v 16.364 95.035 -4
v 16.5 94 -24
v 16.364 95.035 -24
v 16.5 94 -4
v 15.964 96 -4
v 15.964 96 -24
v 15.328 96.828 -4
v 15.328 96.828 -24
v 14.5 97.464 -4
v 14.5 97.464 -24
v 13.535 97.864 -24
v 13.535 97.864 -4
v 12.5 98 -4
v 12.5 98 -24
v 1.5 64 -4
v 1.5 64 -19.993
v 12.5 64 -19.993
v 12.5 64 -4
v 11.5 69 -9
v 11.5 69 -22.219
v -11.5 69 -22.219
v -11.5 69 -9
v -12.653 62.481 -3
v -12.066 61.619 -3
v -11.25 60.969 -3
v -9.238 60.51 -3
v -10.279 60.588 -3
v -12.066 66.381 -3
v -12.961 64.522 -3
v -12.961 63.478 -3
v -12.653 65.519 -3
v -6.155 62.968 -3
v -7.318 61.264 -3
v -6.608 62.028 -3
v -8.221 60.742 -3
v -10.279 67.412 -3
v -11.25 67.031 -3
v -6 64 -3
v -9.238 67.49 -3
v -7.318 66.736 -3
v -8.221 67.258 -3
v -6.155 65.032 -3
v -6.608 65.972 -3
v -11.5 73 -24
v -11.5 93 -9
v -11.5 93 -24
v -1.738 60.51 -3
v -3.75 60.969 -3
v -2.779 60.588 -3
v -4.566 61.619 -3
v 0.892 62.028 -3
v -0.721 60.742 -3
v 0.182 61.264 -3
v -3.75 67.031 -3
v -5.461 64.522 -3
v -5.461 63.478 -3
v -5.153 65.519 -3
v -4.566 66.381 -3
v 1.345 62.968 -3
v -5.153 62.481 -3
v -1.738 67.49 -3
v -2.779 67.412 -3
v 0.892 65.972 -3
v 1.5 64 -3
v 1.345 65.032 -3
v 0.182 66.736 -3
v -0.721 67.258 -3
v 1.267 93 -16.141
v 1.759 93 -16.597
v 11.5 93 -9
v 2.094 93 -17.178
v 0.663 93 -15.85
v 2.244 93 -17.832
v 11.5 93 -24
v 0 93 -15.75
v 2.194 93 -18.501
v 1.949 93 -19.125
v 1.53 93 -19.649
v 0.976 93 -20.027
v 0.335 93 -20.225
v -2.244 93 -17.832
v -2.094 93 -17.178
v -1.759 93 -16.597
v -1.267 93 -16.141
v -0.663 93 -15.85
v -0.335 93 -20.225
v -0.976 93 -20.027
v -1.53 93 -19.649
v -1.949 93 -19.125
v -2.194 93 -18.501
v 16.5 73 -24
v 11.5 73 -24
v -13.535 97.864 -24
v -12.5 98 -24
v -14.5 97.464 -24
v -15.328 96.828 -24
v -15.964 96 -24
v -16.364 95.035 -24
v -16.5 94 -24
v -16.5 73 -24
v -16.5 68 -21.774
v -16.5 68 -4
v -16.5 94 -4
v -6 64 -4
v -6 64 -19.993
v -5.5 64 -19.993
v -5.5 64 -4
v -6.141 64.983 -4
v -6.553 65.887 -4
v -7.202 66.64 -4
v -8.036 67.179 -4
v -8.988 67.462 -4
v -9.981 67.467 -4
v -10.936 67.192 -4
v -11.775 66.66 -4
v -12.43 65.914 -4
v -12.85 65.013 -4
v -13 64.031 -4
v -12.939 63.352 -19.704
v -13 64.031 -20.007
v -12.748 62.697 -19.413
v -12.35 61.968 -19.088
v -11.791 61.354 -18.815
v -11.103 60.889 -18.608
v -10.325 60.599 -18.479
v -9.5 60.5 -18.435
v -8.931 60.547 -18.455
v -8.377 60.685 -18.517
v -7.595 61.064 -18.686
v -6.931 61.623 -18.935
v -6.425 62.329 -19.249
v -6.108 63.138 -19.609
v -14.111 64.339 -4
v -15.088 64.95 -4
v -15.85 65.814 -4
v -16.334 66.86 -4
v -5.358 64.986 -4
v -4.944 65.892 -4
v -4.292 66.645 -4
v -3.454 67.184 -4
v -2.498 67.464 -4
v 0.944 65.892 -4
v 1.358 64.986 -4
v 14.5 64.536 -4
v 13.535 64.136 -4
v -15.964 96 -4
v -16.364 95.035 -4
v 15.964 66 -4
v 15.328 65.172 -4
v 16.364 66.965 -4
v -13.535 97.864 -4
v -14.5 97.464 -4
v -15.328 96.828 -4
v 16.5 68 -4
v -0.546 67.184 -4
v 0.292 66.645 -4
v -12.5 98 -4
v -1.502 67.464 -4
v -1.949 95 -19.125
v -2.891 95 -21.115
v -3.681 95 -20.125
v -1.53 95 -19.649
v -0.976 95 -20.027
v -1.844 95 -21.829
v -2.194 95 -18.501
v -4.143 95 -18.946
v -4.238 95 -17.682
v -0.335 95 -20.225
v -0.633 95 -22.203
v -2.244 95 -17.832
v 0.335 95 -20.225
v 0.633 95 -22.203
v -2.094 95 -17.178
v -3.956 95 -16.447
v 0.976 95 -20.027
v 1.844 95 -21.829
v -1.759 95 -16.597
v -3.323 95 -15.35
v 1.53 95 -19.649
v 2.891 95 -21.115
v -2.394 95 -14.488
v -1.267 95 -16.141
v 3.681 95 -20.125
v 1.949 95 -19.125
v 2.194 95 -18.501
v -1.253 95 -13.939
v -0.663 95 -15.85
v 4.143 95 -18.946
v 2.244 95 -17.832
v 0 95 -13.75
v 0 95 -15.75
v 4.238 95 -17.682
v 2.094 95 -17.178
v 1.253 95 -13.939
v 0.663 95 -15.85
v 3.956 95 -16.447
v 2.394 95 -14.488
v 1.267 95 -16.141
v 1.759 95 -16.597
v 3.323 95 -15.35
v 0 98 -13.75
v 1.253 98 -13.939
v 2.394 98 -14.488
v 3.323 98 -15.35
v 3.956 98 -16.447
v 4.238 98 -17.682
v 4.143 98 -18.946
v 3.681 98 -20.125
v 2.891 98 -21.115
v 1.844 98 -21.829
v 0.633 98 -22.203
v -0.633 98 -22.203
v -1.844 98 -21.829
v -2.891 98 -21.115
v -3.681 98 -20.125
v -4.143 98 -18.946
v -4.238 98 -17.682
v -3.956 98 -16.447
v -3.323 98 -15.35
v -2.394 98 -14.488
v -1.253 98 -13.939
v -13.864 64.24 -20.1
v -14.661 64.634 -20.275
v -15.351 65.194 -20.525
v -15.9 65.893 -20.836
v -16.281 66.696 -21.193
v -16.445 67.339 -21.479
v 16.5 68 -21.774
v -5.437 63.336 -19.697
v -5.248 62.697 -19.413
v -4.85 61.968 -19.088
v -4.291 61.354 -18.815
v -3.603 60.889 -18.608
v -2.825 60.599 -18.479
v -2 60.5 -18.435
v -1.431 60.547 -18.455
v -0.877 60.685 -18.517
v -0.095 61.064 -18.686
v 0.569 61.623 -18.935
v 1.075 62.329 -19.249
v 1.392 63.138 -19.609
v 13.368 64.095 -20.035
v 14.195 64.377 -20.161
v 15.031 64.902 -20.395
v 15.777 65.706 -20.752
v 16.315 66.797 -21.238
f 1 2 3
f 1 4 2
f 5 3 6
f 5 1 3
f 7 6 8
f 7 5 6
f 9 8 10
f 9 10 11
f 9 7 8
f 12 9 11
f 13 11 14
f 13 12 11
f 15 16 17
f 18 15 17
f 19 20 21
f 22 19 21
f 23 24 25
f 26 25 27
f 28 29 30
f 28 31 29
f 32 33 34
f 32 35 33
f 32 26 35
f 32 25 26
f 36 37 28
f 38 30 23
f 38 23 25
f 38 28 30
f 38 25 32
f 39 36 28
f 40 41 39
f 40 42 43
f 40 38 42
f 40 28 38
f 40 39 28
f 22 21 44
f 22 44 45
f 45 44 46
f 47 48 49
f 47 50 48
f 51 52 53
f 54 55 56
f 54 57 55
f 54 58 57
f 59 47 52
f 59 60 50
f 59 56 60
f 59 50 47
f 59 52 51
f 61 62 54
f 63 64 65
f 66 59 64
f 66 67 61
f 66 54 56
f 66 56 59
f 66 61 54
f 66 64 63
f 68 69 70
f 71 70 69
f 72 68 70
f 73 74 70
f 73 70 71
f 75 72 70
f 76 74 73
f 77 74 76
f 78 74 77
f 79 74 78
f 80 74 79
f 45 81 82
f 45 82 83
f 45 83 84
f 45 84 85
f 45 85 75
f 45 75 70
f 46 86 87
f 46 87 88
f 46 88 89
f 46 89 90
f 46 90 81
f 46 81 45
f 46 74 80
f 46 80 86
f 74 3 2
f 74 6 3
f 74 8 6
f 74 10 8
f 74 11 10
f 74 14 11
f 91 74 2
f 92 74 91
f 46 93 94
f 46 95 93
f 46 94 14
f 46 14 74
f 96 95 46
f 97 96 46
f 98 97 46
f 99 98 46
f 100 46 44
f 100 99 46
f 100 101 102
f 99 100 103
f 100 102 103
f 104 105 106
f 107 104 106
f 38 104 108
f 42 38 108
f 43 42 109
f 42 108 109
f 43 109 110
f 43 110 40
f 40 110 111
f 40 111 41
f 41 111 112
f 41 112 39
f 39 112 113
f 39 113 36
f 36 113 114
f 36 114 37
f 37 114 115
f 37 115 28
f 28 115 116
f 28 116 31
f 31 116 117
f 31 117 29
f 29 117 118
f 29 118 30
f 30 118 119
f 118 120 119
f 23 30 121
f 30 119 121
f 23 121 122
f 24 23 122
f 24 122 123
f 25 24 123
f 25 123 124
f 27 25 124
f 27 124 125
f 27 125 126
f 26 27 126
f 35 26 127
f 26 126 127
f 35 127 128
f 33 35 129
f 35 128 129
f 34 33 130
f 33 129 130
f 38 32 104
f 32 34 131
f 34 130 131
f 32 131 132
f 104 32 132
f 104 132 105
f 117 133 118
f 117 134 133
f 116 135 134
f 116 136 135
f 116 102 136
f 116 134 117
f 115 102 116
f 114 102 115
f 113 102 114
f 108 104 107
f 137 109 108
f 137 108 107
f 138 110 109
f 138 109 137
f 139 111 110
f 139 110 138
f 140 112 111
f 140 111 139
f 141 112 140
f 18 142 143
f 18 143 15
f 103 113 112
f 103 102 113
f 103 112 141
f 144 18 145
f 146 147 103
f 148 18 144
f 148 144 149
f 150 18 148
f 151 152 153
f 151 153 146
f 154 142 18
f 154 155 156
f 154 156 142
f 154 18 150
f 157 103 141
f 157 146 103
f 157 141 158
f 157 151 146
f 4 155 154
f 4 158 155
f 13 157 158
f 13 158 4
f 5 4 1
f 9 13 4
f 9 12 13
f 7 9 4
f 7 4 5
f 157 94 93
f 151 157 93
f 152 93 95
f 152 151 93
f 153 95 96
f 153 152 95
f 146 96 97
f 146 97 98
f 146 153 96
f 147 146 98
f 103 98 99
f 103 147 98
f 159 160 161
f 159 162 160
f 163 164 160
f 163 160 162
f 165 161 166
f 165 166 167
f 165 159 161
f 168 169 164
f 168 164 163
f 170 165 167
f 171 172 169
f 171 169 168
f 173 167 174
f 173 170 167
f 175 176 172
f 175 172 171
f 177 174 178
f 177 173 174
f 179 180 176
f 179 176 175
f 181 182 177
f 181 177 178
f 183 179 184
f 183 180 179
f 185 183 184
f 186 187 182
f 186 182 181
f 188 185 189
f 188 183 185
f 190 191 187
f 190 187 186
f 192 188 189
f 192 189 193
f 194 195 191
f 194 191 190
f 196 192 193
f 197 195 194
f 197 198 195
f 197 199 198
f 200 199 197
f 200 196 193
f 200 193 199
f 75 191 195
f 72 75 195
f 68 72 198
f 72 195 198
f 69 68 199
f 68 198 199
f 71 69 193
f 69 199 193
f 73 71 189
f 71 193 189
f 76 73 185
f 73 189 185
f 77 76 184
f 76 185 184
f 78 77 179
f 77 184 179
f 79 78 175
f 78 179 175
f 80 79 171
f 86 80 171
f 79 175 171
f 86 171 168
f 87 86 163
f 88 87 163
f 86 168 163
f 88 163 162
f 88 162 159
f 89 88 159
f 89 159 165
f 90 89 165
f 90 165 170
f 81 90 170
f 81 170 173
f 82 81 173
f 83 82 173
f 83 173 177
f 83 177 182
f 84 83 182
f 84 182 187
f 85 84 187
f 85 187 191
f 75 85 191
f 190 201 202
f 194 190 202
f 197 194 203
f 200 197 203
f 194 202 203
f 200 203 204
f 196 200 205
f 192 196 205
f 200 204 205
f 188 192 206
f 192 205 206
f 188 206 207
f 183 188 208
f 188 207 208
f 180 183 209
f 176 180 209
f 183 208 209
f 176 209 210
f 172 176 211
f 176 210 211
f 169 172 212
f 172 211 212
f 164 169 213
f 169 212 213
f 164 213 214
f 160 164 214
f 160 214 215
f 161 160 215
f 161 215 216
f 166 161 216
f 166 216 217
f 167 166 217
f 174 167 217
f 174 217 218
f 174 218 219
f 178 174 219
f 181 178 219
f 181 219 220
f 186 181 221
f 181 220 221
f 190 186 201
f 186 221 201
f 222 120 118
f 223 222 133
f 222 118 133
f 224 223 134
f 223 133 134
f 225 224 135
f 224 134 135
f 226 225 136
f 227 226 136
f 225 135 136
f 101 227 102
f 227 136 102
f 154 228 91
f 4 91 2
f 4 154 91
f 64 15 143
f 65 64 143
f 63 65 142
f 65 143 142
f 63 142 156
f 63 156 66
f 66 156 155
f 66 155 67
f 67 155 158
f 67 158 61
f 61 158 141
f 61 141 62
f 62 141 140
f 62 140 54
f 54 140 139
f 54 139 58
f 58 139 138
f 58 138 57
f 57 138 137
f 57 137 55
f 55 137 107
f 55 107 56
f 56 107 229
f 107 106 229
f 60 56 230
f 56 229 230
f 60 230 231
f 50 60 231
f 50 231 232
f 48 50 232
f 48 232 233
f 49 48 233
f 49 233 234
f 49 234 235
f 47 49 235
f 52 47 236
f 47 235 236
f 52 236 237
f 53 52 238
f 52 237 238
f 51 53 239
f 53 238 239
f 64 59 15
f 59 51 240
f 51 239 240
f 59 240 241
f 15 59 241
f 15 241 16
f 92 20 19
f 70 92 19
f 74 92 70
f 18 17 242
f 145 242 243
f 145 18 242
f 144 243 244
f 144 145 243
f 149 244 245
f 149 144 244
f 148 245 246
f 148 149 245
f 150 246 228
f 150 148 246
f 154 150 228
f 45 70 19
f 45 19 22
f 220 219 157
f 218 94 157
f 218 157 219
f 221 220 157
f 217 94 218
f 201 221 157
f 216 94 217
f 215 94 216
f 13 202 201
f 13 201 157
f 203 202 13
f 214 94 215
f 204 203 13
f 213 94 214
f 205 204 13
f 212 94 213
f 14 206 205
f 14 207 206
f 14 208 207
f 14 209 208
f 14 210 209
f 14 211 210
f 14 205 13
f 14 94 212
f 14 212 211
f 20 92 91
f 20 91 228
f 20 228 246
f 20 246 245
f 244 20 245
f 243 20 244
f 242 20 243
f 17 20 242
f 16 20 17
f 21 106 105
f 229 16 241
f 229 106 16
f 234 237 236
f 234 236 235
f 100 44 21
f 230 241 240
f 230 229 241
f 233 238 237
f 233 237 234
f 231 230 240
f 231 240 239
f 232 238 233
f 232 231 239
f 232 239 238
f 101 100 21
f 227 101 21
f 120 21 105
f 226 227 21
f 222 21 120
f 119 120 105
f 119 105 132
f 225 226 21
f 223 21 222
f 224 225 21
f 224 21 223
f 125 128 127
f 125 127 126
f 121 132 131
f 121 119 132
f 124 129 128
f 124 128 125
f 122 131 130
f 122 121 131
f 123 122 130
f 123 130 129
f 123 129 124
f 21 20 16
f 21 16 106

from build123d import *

# Parameters (mm, degrees)
SKETCH1_W                 = 4
SKETCH1_H                 = 32
SKETCH2_W                 = 33
SKETCH2_H                 = 34
BOSS_EXTRUDE1_DEPTH       = 20
FILLET1_R                 = 4
SKETCH6_R                 = 3.5
BOSS_EXTRUDE5_DEPTH       = 21
BOSS_EXTRUDE4_DEPTH       = 5
BOSS_EXTRUDE6_DEPTH       = 24
BOSS_EXTRUDE6_DEPTH_BACK  = 29
CHAMFER1_SIZE             = 2.5
CHAMFER1_SIZE2            = 1.443375673
CUT_EXTRUDE1_DEPTH        = 5
SKETCH11_R                = 15
BOSS_EXTRUDE7_DEPTH       = 5
REVOLVE2_ANGLE            = 31
SKETCH14_W                = 100
SKETCH14_H                = 5
CUT_EXTRUDE3_DEPTH        = 71.072541008
CUT_EXTRUDE4_DEPTH        = 128.360121498
FILLET2_R                 = 2
SKETCH16_R                = 14
BOSS_EXTRUDE8_DEPTH       = 1
SKETCH17_W                = 3
SKETCH17_H                = 10
BOSS_EXTRUDE9_DEPTH       = 10
FILLET3_R                 = 5
BOSS_EXTRUDE10_DEPTH      = 11
BOSS_EXTRUDE10_DEPTH_BACK = 11
SKETCH18_R                = 2.5
BOSS_EXTRUDE11_DEPTH      = 7
BOSS_EXTRUDE11_DEPTH_BACK = 7
CUT_EXTRUDE6_DEPTH        = 150.910272613
CUT_EXTRUDE7_DEPTH        = 148.336654753
CUT_EXTRUDE8_START        = -10
CUT_EXTRUDE8_DEPTH        = 10
BOSS_EXTRUDE14_DEPTH      = 11.5
BOSS_EXTRUDE14_DEPTH_BACK = 11.5
SKETCH29_W                = 4
SKETCH29_H                = 5.8
CUT_EXTRUDE9_DEPTH        = 129.091218174
SKETCH30_R                = 1.75
CUT_EXTRUDE10_DEPTH       = 142.472046033
SKETCH31_W                = 39
SKETCH31_H                = 24.998947646
CUT_EXTRUDE11_DEPTH       = 20
CUT_EXTRUDE12_DEPTH       = 29.977320805
CUT_EXTRUDE12_DEPTH_BACK  = 3
SKETCH32_W                = 2.5
SKETCH32_H                = 20
SKETCH33_W                = 8
SKETCH33_H                = 24
CUT_EXTRUDE13_DEPTH       = 3
SKETCH26_R                = 10.5
CUT_EXTRUDE14_DEPTH       = 1
SKETCH34_R                = 0.5
CUT_EXTRUDE15_DEPTH       = 5
CIRPATTERN1_COUNT         = 4
SKETCH35_R                = 3.75
CUT_EXTRUDE16_DEPTH       = 5
CUT_EXTRUDE17_REACH       = 90.337
SKETCH36_W                = 4
SKETCH36_H                = 20
BOSS_EXTRUDE15_DEPTH      = 14
CHAMFER2_SIZE             = 1
CUT_EXTRUDE18_START       = -22.5
CUT_EXTRUDE18_DEPTH       = 7.245247294
CUT_EXTRUDE19_DEPTH       = 137.865224972
CUT_EXTRUDE19_DEPTH_BACK  = 137.865224972
SKETCH40_W                = 5
SKETCH40_H                = 33.621320344
CUT_EXTRUDE20_DEPTH       = 103.304691975
SKETCH41_W                = 23
SKETCH41_H                = 24
CUT_EXTRUDE21_DEPTH       = 15
CUT_EXTRUDE22_REACH       = 49.482
SKETCH42_R                = 2.25
SKETCH43_R                = 4.25
CUT_EXTRUDE23_DEPTH       = 3


# Read off the part's stored shape, not the designer's step: Cut-Extrude18
with BuildPart() as part:
    # Sketch1 → Revolve1 (revolve)
    with BuildSketch(Plane(origin=(0, 0, 0), x_dir=(0, 0, -1), z_dir=(1, 0, 0)), mode=Mode.PRIVATE) as revolve1_sk:
        with Locations((26, 97)):
            Rectangle(SKETCH1_W, SKETCH1_H)
    revolve(revolve1_sk.sketch.rotate(Axis((0, 81, -24), (0, 0, -1)), 90), axis=Axis((0, 81, -24), (0, 0, -1)))

    # Sketch2 → Boss-Extrude1 (add)
    with BuildSketch(Plane.XY.offset(-24)):
        with Locations((0, 81)):
            Rectangle(SKETCH2_W, SKETCH2_H)
    extrude(amount=BOSS_EXTRUDE1_DEPTH)

    # Fillet1
    fillet1_edges = [part.edges().sort_by_distance(p)[0] for p in [
        (-16.5, 98, -14),
        (-16.5, 64, -14),
        (16.5, 64, -14),
        (16.5, 98, -14),
    ]]
    fillet(fillet1_edges, radius=FILLET1_R)

    # Sketch6 → Boss-Extrude5 (add)
    with BuildSketch(Plane.XY.offset(-24)):
        with Locations((-9.5, 64)):
            Circle(SKETCH6_R)
        with Locations((-2, 64)):
            Circle(SKETCH6_R)
    extrude(amount=BOSS_EXTRUDE5_DEPTH)

    # Sketch5 → Boss-Extrude4 (add)
    with BuildSketch(Plane.ZY.offset(16.5)):
        with BuildLine():
            Line((-24, 95.878679656), (-24, 65.878679656))
            Line((-24, 65.878679656), (-24, 64.378679656))
            Line((-24, 64.378679656), (-18, 64.378679656))
            ThreePointArc((-18, 64.378679656), (-13.407206732, 65.949409044), (-10.738156226, 70.003679656))
            ThreePointArc((-10.738156226, 70.003679656), (-9.778946909, 76.271114557), (-10.094291182, 82.603679656))
            ThreePointArc((-10.094291182, 82.603679656), (-10.614769033, 84.232569851), (-11.617642296, 85.617642296))
            Line((-11.617642296, 85.617642296), (-22.939339828, 96.939339828))
            Line((-22.939339828, 96.939339828), (-24, 98))
            Line((-24, 98), (-24, 95.878679656))
        make_face()
    boss_extrude4 = extrude(amount=BOSS_EXTRUDE4_DEPTH)

    # Mirror1: Boss-Extrude4 across plane
    add(boss_extrude4.mirror(Plane(origin=(0, 0, 0), x_dir=(0, 0, 1), z_dir=(1, 0, 0))))

    # Sketch8 → Boss-Extrude6 (add, two sides: drawn at the far end of the back side and taken through both)
    with BuildSketch(Plane(origin=(0, 0, 0), x_dir=(0, 0, -1), z_dir=(1, 0, 0)).offset(-BOSS_EXTRUDE6_DEPTH_BACK)):
        with BuildLine():
            Line((31.001853199, 75.687759622), (24, 73))
            Line((24, 73), (17.208840641, 57.746806342))
            ThreePointArc((17.208840641, 57.746806342), (17.088630828, 53.156178786), (20.249693528, 49.825113738))
            Line((20.249693528, 49.825113738), (51.254059511, 36.021080632))
            Line((51.254059511, 36.021080632), (56.33826755, 47.440398853))
            Line((56.33826755, 47.440398853), (58.041837372, 63.648783017))
            Line((58.041837372, 63.648783017), (31.001853199, 75.687759622))
        make_face()
    extrude(amount=BOSS_EXTRUDE6_DEPTH + BOSS_EXTRUDE6_DEPTH_BACK)

    # Chamfer1
    chamfer1_edges = [part.edges().sort_by_distance(p)[0] for p in [
        (-29, 42.923097185, -35.75187652),
        (-29, 53.156178786, -17.088630828),
        (-29, 65.373403171, -20.60442032),
    ]]
    chamfer1_side = [part.faces().sort_by_distance(p)[0] for p in [
        (-29, 56.351609178, -38.570530073),
    ]]
    chamfer(chamfer1_edges, length=CHAMFER1_SIZE, length2=CHAMFER1_SIZE2, reference=chamfer1_side[0])

    # Sketch10 → Cut-Extrude1 (cut)
    with BuildSketch(Plane(origin=(0, 49.106538634, -21.863639636), x_dir=(1, 0, 0), z_dir=(0, -0.9135454576426004, 0.40673664307580126))):
        Polygon((19, 7.766683961), (-19, 7.766683961), (-19, 1.766683961), (-25, 1.766683961), (-25, -28.171819836), (19, -28.171819836), align=None)
    extrude(amount=-CUT_EXTRUDE1_DEPTH, mode=Mode.SUBTRACT)

    # Sketch11 → Boss-Extrude7 (add)
    with BuildSketch(Plane(origin=(0, 53.674265922, -23.897322851), x_dir=(1, 0, 0), z_dir=(0, -0.9135454576426004, 0.4067366430758013))):
        with Locations(Location((0, -11, 0), (0, 0, 90))):
            Circle(SKETCH11_R)
    extrude(amount=BOSS_EXTRUDE7_DEPTH)

    # Sketch12 → Revolve2 (revolve)
    with BuildSketch(Plane(origin=(0, -17.846986098, -49.476286882), x_dir=(-1, 0, 0), z_dir=(0, -0.10452846326764662, -0.9945218953682741))):
        with BuildLine():
            Line((-47.333333333, 89.657262738), (-50, 86.675838768))
            ThreePointArc((-50, 86.675838768), (0, 67.577538205), (50, 86.675838768))
            Line((50, 86.675838768), (47.333333333, 89.657262738))
            ThreePointArc((47.333333333, 89.657262738), (0, 71.577538205), (-47.333333333, 89.657262738))
        make_face()
    revolve(axis=Axis((0, 118.976887958, -63.857055531), (-1, 0, 0)), revolution_arc=REVOLVE2_ANGLE)

    # Sketch14 → Cut-Extrude3 (cut, through all)
    with BuildSketch(Plane(origin=(0, 74.685811448, -33.252265642), x_dir=(1, 0, 0), z_dir=(0, 0.9135454576425986, -0.40673664307580537))):
        with Locations((0, -2.5)):
            Rectangle(SKETCH14_W, SKETCH14_H)
    extrude(amount=CUT_EXTRUDE3_DEPTH, mode=Mode.SUBTRACT)

    # Sketch15 → Cut-Extrude4 (cut, through all)
    with BuildSketch(Plane(origin=(0, 0, -28), x_dir=(-1, 0, 0), z_dir=(0, 0, -1))):
        with BuildLine():
            Line((-31.513326273, 86.559700282), (-55.043150404, 86.559700282))
            Line((-55.043150404, 86.559700282), (-29.919773925, 69.65067719))
            ThreePointArc((-29.919773925, 69.65067719), (-31.858832613, 77.997536923), (-31.513326273, 86.559700282))
        make_face()
        with BuildLine():
            Line((55.043150404, 86.559700282), (29.919773925, 69.65067719))
            ThreePointArc((29.919773925, 69.65067719), (31.858832613, 77.997536923), (31.513326273, 86.559700282))
            Line((31.513326273, 86.559700282), (55.043150404, 86.559700282))
        make_face()
    extrude(amount=-CUT_EXTRUDE4_DEPTH, mode=Mode.SUBTRACT)

    # Fillet2
    fillet2_edges = [part.edges().sort_by_distance(p)[0] for p in [
        (48.666185859, 78.806391764, -35.086866199),
        (-48.666185859, 78.806391764, -35.086866199),
    ]]
    fillet(fillet2_edges, radius=FILLET2_R)

    # Sketch16 → Boss-Extrude8 (add)
    with BuildSketch(Plane(origin=(0, 49.106538634, -21.863639636), x_dir=(1, 0, 0), z_dir=(0, -0.9135454576426004, 0.4067366430758013))):
        with Locations(Location((0, -11, 0), (0, 0, 270))):
            Circle(SKETCH16_R)
    extrude(amount=BOSS_EXTRUDE8_DEPTH)

    # Sketch17 → Boss-Extrude9 (add)
    with BuildSketch(Plane(origin=(0, 48.192993176, -21.456902993), x_dir=(1, 0, 0), z_dir=(0, -0.9135454576426004, 0.4067366430758013))):
        with Locations((-8.5, -11)):
            Rectangle(SKETCH17_W, SKETCH17_H)
        with Locations((8.5, -11)):
            Rectangle(SKETCH17_W, SKETCH17_H)
    extrude(amount=BOSS_EXTRUDE9_DEPTH)

    # Fillet3
    fillet3_edges = [part.edges().sort_by_distance(p)[0] for p in [
        (8.5, 32.549752311, -32.006263885),
        (8.5, 36.617118741, -22.870809308),
        (-8.5, 32.549752311, -32.006263885),
        (-8.5, 36.617118741, -22.870809308),
    ]]
    fillet(fillet3_edges, radius=FILLET3_R - 0.0001)  # a hair under: the kernel refuses the full size

    # Sketch18 → Boss-Extrude10 (add, two sides: drawn at the far end of the back side and taken through both)
    with BuildSketch(Plane(origin=(0, 0, 0), x_dir=(0, 0, -1), z_dir=(1, 0, 0)).offset(-BOSS_EXTRUDE10_DEPTH_BACK)):
        with Locations((29.472219812, 39.151162814)):
            Circle(SKETCH18_R)
    extrude(amount=BOSS_EXTRUDE10_DEPTH + BOSS_EXTRUDE10_DEPTH_BACK)

    # Sketch19 → Boss-Extrude11 (add, two sides: drawn at the far end of the back side and taken through both)
    with BuildSketch(Plane(origin=(0, 0, 0), x_dir=(0, 0, -1), z_dir=(1, 0, 0)).offset(-BOSS_EXTRUDE11_DEPTH_BACK)):
        Polygon((-9.858637787, 19.29122893), (27.352542755, 42.543355199), (36.583230482, 48.311329057), (40.822584596, 41.526944287), (31.591896869, 35.75897043), (-9.536250046, 10.059251922), align=None)
    extrude(amount=BOSS_EXTRUDE11_DEPTH + BOSS_EXTRUDE11_DEPTH_BACK)

    # Sketch22 → Cut-Extrude6 (cut, through all)
    with BuildSketch(Plane.ZY.offset(29)):
        Polygon((-33.862459198, 76.056328613), (-26.096721215, 58.614195528), (-25.276378018, 67.77859965), (-28, 71.392968097), (-29.918482828, 83.52797246), align=None)
    extrude(amount=CUT_EXTRUDE6_DEPTH, mode=Mode.SUBTRACT)

    # Sketch24 → Cut-Extrude7 (cut, through all)
    with BuildSketch(Plane(origin=(24, 0, 0), x_dir=(0, 0, -1), z_dir=(1, 0, 0))):
        Polygon((33.862459198, 76.056328613), (28.211358934, 63.363749607), (28, 63.363749607), (28, 74.53545614), (31.001853199, 75.687759622), align=None)
    extrude(amount=CUT_EXTRUDE7_DEPTH, mode=Mode.SUBTRACT)

    # Sketch25 → Cut-Extrude8 (cut)
    with BuildSketch(Plane(origin=(0, 0, -28), x_dir=(-1, 0, 0), z_dir=(0, 0, -1)).offset(CUT_EXTRUDE8_START)):
        with BuildLine():
            Line((-32.5084646, 71.392968097), (-38.134327203, 71.392968097))
            add(Edge.make_bspline(
                [(-38.134327203, 71.392968097), (-36.477248939, 70.167781572), (-34.767119143, 69.014339761), (-33.008804526, 67.935816953), (-30.373035757, 66.471137376), (-29.529410915, 66.024103649), (-28.677053697, 65.593954957), (-27.816482516, 65.18091973)],
                knots=[0, 0, 0, 0, 0, 0.507824521, 0.507824521, 0.507824521, 0.743043932, 0.743043932, 0.743043932, 0.743043932, 0.743043932], degree=4))
            ThreePointArc((-27.816482515, 65.180919733), (-28.954507591, 67.375151739), (-29.919773925, 69.65067719))
            Line((-29.919773925, 69.65067719), (-32.5084646, 71.392968097))
        make_face()
    extrude(amount=CUT_EXTRUDE8_DEPTH, mode=Mode.SUBTRACT)

    # Sketch27 → Cut-Revolve1 (revolve, cut)
    with BuildSketch(Plane(origin=(0, 0, 0), x_dir=(0, 0, -1), z_dir=(1, 0, 0))):
        Polygon((28, 64), (68, 53.282032303), (68, 76), (28, 76), align=None)
    revolve(axis=Axis((0, 90, -38), (0, 0, -1)), mode=Mode.SUBTRACT)

    # Sketch28 → Boss-Extrude14 (add, two sides: drawn at the far end of the back side and taken through both)
    with BuildSketch(Plane(origin=(0, 0, 0), x_dir=(0, 0, -1), z_dir=(1, 0, 0)).offset(-BOSS_EXTRUDE14_DEPTH_BACK)):
        Polygon((-9.858637787, 19.29122893), (-5.619283673, 12.506844161), (-14.099764635, 7.207651518), (-18.339118749, 13.992036288), align=None)
    extrude(amount=BOSS_EXTRUDE14_DEPTH + BOSS_EXTRUDE14_DEPTH_BACK)

    # Sketch29 → Cut-Extrude9 (cut, through all)
    with BuildSketch(Plane(origin=(0, 18.304416013, 11.437868571), x_dir=(1, 0, 0), z_dir=(0, 0.8480480961564255, 0.5299192642332059))):
        with Locations((6.5, -3.137805165)):
            Rectangle(SKETCH29_W, SKETCH29_H)
        with Locations((-6.5, -3.137805165)):
            Rectangle(SKETCH29_W, SKETCH29_H)
    extrude(amount=-CUT_EXTRUDE9_DEPTH, mode=Mode.SUBTRACT)

    # Sketch30 → Cut-Extrude10 (cut, through all)
    with BuildSketch(Plane(origin=(11.5, 0, 0), x_dir=(0, 0, -1), z_dir=(1, 0, 0))):
        with Locations((-11.979201211, 13.249440224)):
            Circle(SKETCH30_R)
    extrude(amount=-CUT_EXTRUDE10_DEPTH, mode=Mode.SUBTRACT)

    # Sketch31 → Cut-Extrude11 (cut)
    with BuildSketch(Plane(origin=(0, 74.685811448, -33.252265642), x_dir=(1, 0, 0), z_dir=(0, 0.9135454576425989, -0.40673664307580487))):
        with Locations((-4.5, 10.036090721)):
            Rectangle(SKETCH31_W, SKETCH31_H)
    extrude(amount=-CUT_EXTRUDE11_DEPTH, mode=Mode.SUBTRACT)

    # Sketch32 → Cut-Extrude12 (cut, two sides: drawn at the far end of the back side and taken through both)
    with BuildSketch(Plane(origin=(0, 1.001948174, 2.250412443), x_dir=(-1, 0, 0), z_dir=(0, -0.4067366430758048, -0.9135454576425989)).offset(-CUT_EXTRUDE12_DEPTH_BACK)):
        with Locations((3.25, 71.753798701)):
            Rectangle(SKETCH32_W, SKETCH32_H)
    extrude(amount=CUT_EXTRUDE12_DEPTH + CUT_EXTRUDE12_DEPTH_BACK, mode=Mode.SUBTRACT)

    # Sketch33 → Cut-Extrude13 (cut)
    with BuildSketch(Plane(origin=(0, 56.414902295, -25.117532781), x_dir=(1, 0, 0), z_dir=(0, 0.9135454576425986, -0.4067366430758051))):
        with Locations((-19, 10.233316039)):
            Rectangle(SKETCH33_W, SKETCH33_H)
    extrude(amount=-CUT_EXTRUDE13_DEPTH, mode=Mode.SUBTRACT)

    # Sketch26 → Cut-Extrude14 (cut)
    with BuildSketch(Plane(origin=(0, 0, -28), x_dir=(-1, 0, 0), z_dir=(0, 0, -1))):
        with Locations((0, 81)):
            Circle(SKETCH26_R)
    extrude(amount=-CUT_EXTRUDE14_DEPTH, mode=Mode.SUBTRACT)

    # Sketch34 → Cut-Extrude15 (cut)
    with BuildSketch(Plane(origin=(0, 0, -27), x_dir=(-1, 0, 0), z_dir=(0, 0, -1))):
        with Locations((-3, 88.5)):
            Circle(SKETCH34_R)
        with Locations((0, 88.5)):
            Circle(SKETCH34_R)
        with Locations((3, 88.5)):
            Circle(SKETCH34_R)
    cut_extrude15 = extrude(amount=-CUT_EXTRUDE15_DEPTH, mode=Mode.SUBTRACT)

    # CirPattern1: Cut-Extrude15 ×4 about axis
    cirpattern1_axis = Axis((0, 81, 0), (0, 0, 1))
    for i in range(1, CIRPATTERN1_COUNT):
        add(cut_extrude15.rotate(cirpattern1_axis, i * 360 / CIRPATTERN1_COUNT), mode=Mode.SUBTRACT)

    # Sketch35 → Cut-Extrude16 (cut)
    with BuildSketch(Plane(origin=(0, 0, -27), x_dir=(-1, 0, 0), z_dir=(0, 0, -1))):
        with Locations((0, 81)):
            Circle(SKETCH35_R)
    extrude(amount=-CUT_EXTRUDE16_DEPTH, mode=Mode.SUBTRACT)

    # Sketch36 → Cut-Extrude17 (cut, up to next)
    with BuildSketch(Plane(origin=(0, 53.674265922, -23.897322851), x_dir=(1, 0, 0), z_dir=(0, -0.9135454576426004, 0.4067366430758015)), mode=Mode.PRIVATE) as cut_extrude17_sk1:
        with Locations((17, -11)):
            Rectangle(SKETCH36_W, SKETCH36_H)
    cut_extrude17_tool1 = extrude(cut_extrude17_sk1.sketch, amount=-CUT_EXTRUDE17_REACH, mode=Mode.PRIVATE) & part.part
    add(cut_extrude17_tool1.solids().sort_by_distance((17, 49.200163, -33.946323))[0], mode=Mode.SUBTRACT)

    # Sketch37 → Boss-Extrude15 (add)
    with BuildSketch(Plane(origin=(-7, 0, 0), x_dir=(0, 0, -1), z_dir=(1, 0, 0))):
        with BuildLine():
            Line((26.938175739, 45.752573318), (24.904492523, 41.18484603))
            ThreePointArc((24.904492523, 41.18484603), (24.854997538, 41.069823408), (24.808398466, 40.953597406))
            Line((24.808398466, 40.953597406), (30.179134274, 44.30960561))
            Line((30.179134274, 44.30960561), (26.938175739, 45.752573318))
        make_face()
    extrude(amount=BOSS_EXTRUDE15_DEPTH)

    # Chamfer2
    chamfer2_edges = [part.edges().sort_by_distance(p)[0] for p in [
        (3.275817755, 90.975921914, -28),
    ]]
    chamfer(chamfer2_edges, length=CHAMFER2_SIZE - 0.0001)  # a hair under: the kernel refuses the full size

    # Cut-Extrude18 outline → Cut-Extrude18 (cut)
    with BuildSketch(Plane.YZ.offset(CUT_EXTRUDE18_START)):
        Polygon((68.945486948, -28), (75.687759622, -31.001853199), (74.53545614, -28), align=None)
    extrude(amount=CUT_EXTRUDE18_DEPTH, mode=Mode.SUBTRACT)

    # Sketch39 → Cut-Extrude19 (cut, two sides: drawn at the far end of the back side and taken through both)
    with BuildSketch(Plane(origin=(0, 0, 0), x_dir=(0, 0, -1), z_dir=(1, 0, 0)).offset(-CUT_EXTRUDE19_DEPTH_BACK)):
        Polygon((24, 113), (24, 73), (18.434641434, 60.5), (3, 60.5), (-18.339118749, 13.992036288), (-14.099764635, 7.207651518), (51.254059511, 36.021080632), (56.33826755, 47.440398853), (58.848022777, 71.319124773), (28, 113), align=None)
    extrude(amount=CUT_EXTRUDE19_DEPTH + CUT_EXTRUDE19_DEPTH_BACK, mode=Mode.SUBTRACT)

    # Sketch40 → Cut-Extrude20 (cut, through all)
    with BuildSketch(Plane.XY.offset(-4)):
        with Locations((-19, 81.189339828)):
            Rectangle(SKETCH40_W, SKETCH40_H)
        with Locations((19, 81.189339828)):
            Rectangle(SKETCH40_W, SKETCH40_H)
    extrude(amount=-CUT_EXTRUDE20_DEPTH, mode=Mode.SUBTRACT)

    # Sketch41 → Cut-Extrude21 (cut)
    with BuildSketch(Plane(origin=(0, 0, -24), x_dir=(-1, 0, 0), z_dir=(0, 0, -1))):
        with Locations((0, 81)):
            Rectangle(SKETCH41_W, SKETCH41_H)
    extrude(amount=-CUT_EXTRUDE21_DEPTH, mode=Mode.SUBTRACT)

    # Sketch42 → Cut-Extrude22 (cut, up to next)
    with BuildSketch(Plane(origin=(0, 98, 0), x_dir=(1, 0, 0), z_dir=(0, 1, 0)), mode=Mode.PRIVATE) as cut_extrude22_sk1:
        with Locations(Location((0, 18, 0), (0, 0, 270))):
            Circle(SKETCH42_R)
    cut_extrude22_tool1 = extrude(cut_extrude22_sk1.sketch, amount=-CUT_EXTRUDE22_REACH, mode=Mode.PRIVATE) & part.part
    add(cut_extrude22_tool1.solids().sort_by_distance((0, 98, -18))[0], mode=Mode.SUBTRACT)

    # Sketch43 → Cut-Extrude23 (cut)
    with BuildSketch(Plane(origin=(0, 98, 0), x_dir=(1, 0, 0), z_dir=(0, 1, 0))):
        with Locations(Location((0, 18, 0), (0, 0, 270))):
            Circle(SKETCH43_R)
    extrude(amount=-CUT_EXTRUDE23_DEPTH, mode=Mode.SUBTRACT)


solid = part.part
